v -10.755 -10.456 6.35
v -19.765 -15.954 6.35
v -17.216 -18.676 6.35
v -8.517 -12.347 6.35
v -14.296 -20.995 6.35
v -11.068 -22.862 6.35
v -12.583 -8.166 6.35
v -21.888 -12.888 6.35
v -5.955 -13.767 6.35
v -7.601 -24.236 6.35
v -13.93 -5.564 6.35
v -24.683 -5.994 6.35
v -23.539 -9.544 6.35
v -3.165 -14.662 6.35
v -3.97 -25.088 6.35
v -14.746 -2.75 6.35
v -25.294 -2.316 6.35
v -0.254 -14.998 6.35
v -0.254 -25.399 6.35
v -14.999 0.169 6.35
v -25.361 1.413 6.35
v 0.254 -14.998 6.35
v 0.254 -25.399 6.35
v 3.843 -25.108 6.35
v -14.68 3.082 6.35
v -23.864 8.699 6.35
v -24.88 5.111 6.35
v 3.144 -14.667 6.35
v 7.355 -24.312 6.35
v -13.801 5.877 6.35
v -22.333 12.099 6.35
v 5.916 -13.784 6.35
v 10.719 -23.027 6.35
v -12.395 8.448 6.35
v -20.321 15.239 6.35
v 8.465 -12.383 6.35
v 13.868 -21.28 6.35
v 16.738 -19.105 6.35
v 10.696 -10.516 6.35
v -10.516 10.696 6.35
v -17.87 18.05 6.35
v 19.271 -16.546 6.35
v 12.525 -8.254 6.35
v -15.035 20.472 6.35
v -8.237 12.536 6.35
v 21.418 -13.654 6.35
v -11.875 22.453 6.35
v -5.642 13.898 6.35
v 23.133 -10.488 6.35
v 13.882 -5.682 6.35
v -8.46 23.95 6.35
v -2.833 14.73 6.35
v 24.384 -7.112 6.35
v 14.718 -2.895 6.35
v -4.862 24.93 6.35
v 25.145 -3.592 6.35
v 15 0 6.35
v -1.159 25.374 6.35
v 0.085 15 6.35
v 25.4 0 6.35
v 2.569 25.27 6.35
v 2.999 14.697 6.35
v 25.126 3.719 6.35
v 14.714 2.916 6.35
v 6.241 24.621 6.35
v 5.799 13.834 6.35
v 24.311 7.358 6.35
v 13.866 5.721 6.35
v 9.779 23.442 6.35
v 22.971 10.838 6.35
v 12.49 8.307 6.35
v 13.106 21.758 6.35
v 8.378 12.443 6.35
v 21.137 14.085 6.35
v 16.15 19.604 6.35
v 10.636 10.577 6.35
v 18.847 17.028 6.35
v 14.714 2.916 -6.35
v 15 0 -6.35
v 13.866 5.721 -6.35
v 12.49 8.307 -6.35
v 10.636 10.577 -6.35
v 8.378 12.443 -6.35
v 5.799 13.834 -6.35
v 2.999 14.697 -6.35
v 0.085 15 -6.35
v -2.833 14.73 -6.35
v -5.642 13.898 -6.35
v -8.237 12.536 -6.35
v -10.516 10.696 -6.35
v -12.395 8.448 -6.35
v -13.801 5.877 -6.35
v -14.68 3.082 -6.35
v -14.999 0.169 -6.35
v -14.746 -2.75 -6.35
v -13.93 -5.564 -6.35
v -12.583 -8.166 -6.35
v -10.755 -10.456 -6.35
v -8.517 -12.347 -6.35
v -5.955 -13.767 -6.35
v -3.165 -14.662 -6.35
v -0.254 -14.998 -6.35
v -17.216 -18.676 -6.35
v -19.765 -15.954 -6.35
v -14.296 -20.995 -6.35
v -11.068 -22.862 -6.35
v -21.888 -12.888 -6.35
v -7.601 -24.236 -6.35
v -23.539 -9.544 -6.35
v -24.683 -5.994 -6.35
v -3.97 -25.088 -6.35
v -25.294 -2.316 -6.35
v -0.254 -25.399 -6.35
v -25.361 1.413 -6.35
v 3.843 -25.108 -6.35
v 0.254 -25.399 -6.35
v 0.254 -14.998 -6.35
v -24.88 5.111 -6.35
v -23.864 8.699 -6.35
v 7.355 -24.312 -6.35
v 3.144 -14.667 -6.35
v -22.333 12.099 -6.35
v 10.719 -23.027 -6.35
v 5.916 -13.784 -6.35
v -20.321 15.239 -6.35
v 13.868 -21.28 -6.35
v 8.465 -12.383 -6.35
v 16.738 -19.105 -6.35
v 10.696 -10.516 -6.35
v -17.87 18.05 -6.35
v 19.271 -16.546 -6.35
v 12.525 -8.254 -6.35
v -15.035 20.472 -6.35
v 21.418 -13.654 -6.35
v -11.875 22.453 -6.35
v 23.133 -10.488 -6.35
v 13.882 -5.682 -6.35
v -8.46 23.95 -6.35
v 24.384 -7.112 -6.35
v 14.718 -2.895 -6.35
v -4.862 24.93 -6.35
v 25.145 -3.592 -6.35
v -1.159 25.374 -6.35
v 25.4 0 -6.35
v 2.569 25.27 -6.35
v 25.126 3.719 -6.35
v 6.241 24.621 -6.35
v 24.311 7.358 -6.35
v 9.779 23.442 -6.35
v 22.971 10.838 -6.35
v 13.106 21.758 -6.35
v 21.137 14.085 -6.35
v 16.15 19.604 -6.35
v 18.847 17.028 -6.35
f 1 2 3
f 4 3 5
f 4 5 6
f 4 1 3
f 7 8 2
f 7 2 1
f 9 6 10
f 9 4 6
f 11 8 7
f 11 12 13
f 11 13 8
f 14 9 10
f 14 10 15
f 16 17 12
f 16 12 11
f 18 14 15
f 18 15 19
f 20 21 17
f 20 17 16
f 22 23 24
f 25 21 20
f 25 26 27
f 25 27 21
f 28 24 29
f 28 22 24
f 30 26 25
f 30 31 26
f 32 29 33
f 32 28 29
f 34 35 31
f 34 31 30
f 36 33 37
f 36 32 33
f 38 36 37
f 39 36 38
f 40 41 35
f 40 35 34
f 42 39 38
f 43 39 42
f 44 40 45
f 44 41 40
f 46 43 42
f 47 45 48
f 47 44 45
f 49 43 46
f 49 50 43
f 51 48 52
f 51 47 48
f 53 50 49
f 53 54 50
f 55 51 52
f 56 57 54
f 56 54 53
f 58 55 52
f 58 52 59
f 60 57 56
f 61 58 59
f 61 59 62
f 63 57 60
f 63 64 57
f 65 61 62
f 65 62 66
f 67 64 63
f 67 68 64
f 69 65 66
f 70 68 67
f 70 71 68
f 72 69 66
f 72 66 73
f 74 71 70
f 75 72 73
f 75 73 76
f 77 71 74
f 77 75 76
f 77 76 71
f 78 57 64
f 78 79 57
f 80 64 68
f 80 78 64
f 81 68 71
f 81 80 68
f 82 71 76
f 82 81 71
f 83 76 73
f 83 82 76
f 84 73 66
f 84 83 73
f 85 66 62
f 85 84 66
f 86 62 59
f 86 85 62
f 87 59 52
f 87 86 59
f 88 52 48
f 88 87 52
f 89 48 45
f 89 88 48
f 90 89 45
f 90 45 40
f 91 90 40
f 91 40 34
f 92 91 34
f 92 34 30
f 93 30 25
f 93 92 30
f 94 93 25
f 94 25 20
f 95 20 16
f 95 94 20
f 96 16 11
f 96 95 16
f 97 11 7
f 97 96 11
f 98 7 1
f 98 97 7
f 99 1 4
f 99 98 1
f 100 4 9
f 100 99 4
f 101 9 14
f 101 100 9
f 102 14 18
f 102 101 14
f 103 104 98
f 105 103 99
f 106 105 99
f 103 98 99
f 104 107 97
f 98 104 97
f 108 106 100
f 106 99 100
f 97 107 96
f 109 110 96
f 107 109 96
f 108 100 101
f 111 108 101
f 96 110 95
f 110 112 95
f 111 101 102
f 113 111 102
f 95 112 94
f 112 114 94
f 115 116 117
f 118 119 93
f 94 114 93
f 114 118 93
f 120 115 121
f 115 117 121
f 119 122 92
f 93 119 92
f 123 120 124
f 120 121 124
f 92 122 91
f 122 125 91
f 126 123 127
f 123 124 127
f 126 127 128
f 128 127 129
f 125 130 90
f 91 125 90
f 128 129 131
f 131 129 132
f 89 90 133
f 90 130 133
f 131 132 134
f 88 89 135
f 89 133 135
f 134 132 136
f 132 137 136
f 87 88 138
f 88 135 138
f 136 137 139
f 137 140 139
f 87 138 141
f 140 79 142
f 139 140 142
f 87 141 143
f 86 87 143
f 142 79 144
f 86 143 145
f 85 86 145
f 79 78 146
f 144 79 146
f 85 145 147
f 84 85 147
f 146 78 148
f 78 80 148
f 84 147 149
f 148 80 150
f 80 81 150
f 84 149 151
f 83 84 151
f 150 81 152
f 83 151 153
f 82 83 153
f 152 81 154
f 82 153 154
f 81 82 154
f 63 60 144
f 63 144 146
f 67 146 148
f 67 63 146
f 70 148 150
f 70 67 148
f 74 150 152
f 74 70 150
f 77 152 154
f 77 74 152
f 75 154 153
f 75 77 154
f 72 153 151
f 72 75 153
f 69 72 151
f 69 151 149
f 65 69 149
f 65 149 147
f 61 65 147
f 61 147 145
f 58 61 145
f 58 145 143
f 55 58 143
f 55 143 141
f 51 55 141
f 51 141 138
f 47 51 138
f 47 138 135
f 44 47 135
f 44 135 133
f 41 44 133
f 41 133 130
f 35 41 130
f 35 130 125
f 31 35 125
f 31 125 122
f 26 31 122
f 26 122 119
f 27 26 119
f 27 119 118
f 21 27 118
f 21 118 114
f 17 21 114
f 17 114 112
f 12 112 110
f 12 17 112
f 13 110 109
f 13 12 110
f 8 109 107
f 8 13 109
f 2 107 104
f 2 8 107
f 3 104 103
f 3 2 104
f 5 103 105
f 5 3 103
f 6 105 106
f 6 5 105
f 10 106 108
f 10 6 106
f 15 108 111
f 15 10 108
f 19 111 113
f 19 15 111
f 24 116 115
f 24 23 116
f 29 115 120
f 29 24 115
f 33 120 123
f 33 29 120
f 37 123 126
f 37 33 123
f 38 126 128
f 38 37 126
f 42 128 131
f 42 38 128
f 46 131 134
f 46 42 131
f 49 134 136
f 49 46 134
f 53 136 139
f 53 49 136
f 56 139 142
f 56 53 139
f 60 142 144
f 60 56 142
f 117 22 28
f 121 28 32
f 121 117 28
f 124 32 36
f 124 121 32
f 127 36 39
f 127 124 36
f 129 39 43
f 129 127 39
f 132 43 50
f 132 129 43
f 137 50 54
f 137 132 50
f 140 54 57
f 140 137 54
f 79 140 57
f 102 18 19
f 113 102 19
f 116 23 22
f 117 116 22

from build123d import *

# Parameters (mm, degrees)
F0_R     = 25.4
F0_R_2   = 15
F1_DEPTH = 6.35
F3_DEPTH = 12.701


with BuildPart() as f1:
    # F0 (on Top) → F1 (new body, symmetric)
    with BuildSketch(Plane.XY):
        Circle(F0_R)
        Circle(F0_R_2, mode=Mode.SUBTRACT)
    extrude(amount=F1_DEPTH, both=True)

    # F2 (on face) → F3 (cut, through all)
    with BuildSketch(Plane.XY.offset(6.35)):
        with BuildLine():
            ThreePointArc((0.254, -14.9978493125), (0, -15), (-0.254, -14.9978493125))
            Line((-0.254, -14.9978493125), (-0.254, -25.3987299682))
            ThreePointArc((-0.254, -25.3987299682), (0, -25.4), (0.254, -25.3987299682))
            Line((0.254, -25.3987299682), (0.254, -14.9978493125))
        make_face()
    extrude(amount=-F3_DEPTH, mode=Mode.SUBTRACT)


solid = f1.part
